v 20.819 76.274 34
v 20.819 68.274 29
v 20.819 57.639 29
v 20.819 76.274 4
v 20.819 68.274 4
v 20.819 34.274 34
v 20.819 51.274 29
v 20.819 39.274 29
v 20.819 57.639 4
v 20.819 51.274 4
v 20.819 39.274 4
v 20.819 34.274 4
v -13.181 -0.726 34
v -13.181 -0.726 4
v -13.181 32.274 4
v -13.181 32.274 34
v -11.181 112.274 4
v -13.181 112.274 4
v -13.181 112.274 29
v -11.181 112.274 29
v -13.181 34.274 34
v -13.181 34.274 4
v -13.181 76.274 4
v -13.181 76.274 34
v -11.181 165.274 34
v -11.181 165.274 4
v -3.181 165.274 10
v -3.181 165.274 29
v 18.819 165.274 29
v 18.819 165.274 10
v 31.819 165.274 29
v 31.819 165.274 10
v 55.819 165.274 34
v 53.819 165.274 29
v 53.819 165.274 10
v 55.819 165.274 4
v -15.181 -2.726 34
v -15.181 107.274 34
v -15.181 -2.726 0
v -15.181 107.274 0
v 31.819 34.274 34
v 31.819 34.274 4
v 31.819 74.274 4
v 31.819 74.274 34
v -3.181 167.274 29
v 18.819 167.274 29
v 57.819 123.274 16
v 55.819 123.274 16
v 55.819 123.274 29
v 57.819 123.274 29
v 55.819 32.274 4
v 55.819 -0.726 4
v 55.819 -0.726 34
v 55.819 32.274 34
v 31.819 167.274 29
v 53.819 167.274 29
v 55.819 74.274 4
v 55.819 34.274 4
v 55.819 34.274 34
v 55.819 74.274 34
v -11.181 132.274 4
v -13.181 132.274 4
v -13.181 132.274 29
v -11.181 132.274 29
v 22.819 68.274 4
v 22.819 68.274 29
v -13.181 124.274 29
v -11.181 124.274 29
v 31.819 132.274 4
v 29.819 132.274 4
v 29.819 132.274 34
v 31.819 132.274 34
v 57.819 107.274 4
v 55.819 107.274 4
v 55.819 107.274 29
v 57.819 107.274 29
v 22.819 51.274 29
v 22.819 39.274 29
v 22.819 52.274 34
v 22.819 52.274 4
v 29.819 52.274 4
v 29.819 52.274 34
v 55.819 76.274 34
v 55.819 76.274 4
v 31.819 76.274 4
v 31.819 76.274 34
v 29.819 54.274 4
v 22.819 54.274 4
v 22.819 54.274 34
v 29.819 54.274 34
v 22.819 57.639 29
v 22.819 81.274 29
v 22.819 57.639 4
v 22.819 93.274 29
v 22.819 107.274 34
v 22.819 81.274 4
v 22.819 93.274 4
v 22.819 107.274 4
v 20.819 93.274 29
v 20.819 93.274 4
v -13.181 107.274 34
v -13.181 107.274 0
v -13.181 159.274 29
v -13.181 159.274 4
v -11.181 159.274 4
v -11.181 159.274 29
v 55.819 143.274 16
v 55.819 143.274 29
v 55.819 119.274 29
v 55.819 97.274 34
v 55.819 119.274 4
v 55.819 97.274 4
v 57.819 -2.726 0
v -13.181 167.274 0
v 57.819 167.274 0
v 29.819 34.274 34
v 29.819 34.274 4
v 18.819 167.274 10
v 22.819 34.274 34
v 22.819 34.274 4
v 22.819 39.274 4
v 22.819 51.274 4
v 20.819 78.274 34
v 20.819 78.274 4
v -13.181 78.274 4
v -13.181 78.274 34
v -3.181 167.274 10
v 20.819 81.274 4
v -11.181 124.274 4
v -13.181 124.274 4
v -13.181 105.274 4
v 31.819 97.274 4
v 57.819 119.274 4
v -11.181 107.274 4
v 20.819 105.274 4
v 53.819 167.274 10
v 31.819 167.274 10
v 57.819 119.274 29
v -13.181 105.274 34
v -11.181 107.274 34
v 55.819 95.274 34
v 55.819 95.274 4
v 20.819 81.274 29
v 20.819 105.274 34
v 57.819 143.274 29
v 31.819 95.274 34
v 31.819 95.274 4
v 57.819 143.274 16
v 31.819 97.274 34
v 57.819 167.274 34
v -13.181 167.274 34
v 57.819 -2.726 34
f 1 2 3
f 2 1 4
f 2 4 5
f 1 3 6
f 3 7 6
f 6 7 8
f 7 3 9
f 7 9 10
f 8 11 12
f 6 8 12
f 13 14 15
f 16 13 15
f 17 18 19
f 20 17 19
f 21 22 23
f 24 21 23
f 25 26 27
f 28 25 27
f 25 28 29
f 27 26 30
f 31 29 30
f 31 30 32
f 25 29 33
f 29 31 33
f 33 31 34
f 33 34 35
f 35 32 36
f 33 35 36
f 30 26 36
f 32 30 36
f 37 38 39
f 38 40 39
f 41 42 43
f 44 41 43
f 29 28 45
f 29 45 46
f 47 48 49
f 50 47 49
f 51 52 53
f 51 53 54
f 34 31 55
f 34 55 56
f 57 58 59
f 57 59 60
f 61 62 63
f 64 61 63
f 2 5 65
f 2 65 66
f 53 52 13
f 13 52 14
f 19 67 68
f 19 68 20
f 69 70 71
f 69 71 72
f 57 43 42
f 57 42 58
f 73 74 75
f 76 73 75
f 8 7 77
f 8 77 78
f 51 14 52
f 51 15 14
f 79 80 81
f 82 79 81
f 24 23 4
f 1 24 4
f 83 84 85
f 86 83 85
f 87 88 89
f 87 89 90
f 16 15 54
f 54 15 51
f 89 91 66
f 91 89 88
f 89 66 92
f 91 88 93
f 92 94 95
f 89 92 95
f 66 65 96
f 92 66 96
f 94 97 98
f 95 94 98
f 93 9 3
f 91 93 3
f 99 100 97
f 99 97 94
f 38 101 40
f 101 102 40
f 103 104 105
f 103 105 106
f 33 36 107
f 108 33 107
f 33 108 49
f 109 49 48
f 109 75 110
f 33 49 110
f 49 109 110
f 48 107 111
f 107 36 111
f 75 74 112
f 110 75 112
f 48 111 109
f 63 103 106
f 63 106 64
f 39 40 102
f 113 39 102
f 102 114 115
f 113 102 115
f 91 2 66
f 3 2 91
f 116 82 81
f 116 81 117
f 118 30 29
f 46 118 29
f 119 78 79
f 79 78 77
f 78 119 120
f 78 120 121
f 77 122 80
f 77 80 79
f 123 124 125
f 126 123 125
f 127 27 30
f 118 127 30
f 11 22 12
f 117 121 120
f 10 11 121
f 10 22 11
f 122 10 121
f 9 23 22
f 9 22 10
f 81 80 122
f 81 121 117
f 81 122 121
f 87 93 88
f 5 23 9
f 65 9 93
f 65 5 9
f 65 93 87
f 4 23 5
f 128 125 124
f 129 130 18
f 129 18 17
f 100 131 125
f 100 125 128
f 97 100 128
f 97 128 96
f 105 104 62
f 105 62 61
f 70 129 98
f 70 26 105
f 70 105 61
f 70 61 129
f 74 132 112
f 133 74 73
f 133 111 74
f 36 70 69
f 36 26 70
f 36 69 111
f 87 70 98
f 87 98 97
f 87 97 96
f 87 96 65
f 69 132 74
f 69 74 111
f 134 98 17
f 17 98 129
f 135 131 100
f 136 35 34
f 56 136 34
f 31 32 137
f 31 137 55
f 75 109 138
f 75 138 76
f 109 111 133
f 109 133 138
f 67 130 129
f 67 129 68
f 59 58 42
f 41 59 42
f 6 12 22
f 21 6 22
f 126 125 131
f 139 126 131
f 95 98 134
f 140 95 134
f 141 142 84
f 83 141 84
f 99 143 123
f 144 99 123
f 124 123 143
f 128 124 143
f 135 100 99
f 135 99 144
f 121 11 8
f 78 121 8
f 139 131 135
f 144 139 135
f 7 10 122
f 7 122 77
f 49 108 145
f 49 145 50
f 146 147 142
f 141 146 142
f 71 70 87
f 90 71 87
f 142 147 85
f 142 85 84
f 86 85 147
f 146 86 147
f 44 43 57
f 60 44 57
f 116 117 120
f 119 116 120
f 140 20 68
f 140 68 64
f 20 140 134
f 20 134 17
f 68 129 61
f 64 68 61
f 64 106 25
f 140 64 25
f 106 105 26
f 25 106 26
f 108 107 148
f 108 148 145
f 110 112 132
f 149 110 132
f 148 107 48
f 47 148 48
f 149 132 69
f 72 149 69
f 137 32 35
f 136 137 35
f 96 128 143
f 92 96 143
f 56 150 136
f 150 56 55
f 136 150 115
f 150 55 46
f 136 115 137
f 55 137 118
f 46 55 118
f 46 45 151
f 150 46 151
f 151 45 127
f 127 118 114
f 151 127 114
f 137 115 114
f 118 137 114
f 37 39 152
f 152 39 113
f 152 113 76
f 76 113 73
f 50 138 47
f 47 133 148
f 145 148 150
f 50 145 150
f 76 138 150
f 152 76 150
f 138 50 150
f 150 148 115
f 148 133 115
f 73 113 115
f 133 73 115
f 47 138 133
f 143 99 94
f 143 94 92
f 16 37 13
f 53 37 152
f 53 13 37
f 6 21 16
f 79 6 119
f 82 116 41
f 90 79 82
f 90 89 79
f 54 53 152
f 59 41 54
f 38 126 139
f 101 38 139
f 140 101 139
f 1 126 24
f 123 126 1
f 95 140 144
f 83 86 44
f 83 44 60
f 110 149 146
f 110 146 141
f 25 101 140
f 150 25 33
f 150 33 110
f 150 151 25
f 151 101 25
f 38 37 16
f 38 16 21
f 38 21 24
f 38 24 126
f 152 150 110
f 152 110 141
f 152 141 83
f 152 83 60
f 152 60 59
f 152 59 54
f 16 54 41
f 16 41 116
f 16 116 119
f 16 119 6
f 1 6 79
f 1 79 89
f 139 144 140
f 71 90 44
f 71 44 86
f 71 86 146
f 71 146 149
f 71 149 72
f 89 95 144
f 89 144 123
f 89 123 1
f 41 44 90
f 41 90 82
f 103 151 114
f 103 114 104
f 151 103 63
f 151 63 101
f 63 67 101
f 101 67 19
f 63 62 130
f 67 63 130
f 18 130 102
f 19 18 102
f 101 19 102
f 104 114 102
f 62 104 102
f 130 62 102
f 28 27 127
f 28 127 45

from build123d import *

# Parameters (mm, degrees)
F2_W      = 2
F2_H      = 110
F3_DEPTH  = 4
F4_W      = 2
F4_H      = 33
F4_H_2    = 40
F4_H_3    = 27
F4_H_4    = 19
F4_H_5    = 35
F4_W_2    = 7
F4_H_6    = 2
F5_DEPTH  = 30
F6_W      = 12
F6_H      = 25
F6_W_2    = 27
F7_DEPTH  = 2
F8_W      = 12
F8_H      = 25
F8_W_2    = 20
F8_H_2    = 13
F9_DEPTH  = 2
F10_W     = 22
F10_H     = 19
F11_DEPTH = 2
F12_W     = 12
F12_H     = 25
F12_W_2   = 10.6349699199
F13_DEPTH = 2


with BuildPart() as f3:
    # F2 (on Top) → F3 (new body)
    with BuildSketch(Plane.XY):
        Polygon((57.8188975325, 167.2736013268), (-13.1811024675, 167.2736013268), (-13.1811024675, 107.2736013268), (-13.1811024675, -2.7263986732), (57.8188975325, -2.7263986732), align=None)
        with Locations((-14.1811024675, 52.2736013268)):
            Rectangle(F2_W, F2_H)
    extrude(amount=F3_DEPTH)

    # F4 (on face) → F5 (join)
    with BuildSketch(Plane.XY.offset(4)):
        with Locations((56.8188975325, 15.7736013268)):
            Rectangle(F4_W, F4_H)
        with Locations((56.8188975325, 54.2736013268)):
            Rectangle(F4_W, F4_H_2)
        Polygon((-13.1811024675, 167.2736013268), (-13.1811024675, 107.2736013268), (-11.1811024675, 107.2736013268), (-11.1811024675, 165.2736013268), (-11.1811024675, 167.2736013268), align=None)
        Polygon((-11.1811024675, 167.2736013268), (-11.1811024675, 165.2736013268), (55.8188975325, 165.2736013268), (57.8188975325, 165.2736013268), (57.8188975325, 167.2736013268), align=None)
        Polygon((-15.1811024675, -0.7263986732), (-15.1811024675, -2.7263986732), (57.8188975325, -2.7263986732), (57.8188975325, -0.7263986732), (55.8188975325, -0.7263986732), (27.8188975325, -0.7263986732), (25.8188975325, -0.7263986732), (-13.1811024675, -0.7263986732), align=None)
        Polygon((-11.1811024675, 107.2736013268), (-13.1811024675, 107.2736013268), (-13.1811024675, 105.2736013268), (20.8188975325, 105.2736013268), (22.8188975325, 105.2736013268), (22.8188975325, 107.2736013268), align=None)
        Polygon((55.8188975325, 76.2736013268), (57.8188975325, 76.2736013268), (57.8188975325, 165.2736013268), (55.8188975325, 165.2736013268), (55.8188975325, 97.2736013268), (55.8188975325, 95.2736013268), align=None)
        Polygon((-15.1811024675, 107.2736013268), (-15.1811024675, -0.7263986732), (-13.1811024675, -0.7263986732), (-13.1811024675, 32.2736013268), (-13.1811024675, 34.2736013268), (-13.1811024675, 76.2736013268), (-13.1811024675, 78.2736013268), (-13.1811024675, 105.2736013268), (-13.1811024675, 107.2736013268), align=None)
        Polygon((55.8188975325, 74.2736013268), (57.8188975325, 74.2736013268), (57.8188975325, 76.2736013268), (55.8188975325, 76.2736013268), (31.8188975325, 76.2736013268), (29.8188975325, 76.2736013268), (29.8188975325, 74.2736013268), (31.8188975325, 74.2736013268), align=None)
        Polygon((55.8188975325, 32.2736013268), (57.8188975325, 32.2736013268), (57.8188975325, 34.2736013268), (55.8188975325, 34.2736013268), (31.8188975325, 34.2736013268), (29.8188975325, 34.2736013268), (22.8188975325, 34.2736013268), (20.8188975325, 34.2736013268), (-13.1811024675, 34.2736013268), (-13.1811024675, 32.2736013268), (25.8188975325, 32.2736013268), (27.8188975325, 32.2736013268), align=None)
        with Locations((21.8188975325, 91.7736013268)):
            Rectangle(F4_W, F4_H_3)
        Polygon((20.8188975325, 76.2736013268), (20.8188975325, 34.2736013268), (22.8188975325, 34.2736013268), (22.8188975325, 52.2736013268), (22.8188975325, 54.2736013268), (22.8188975325, 76.2736013268), align=None)
        Polygon((-13.1811024675, 78.2736013268), (-13.1811024675, 76.2736013268), (20.8188975325, 76.2736013268), (22.8188975325, 76.2736013268), (22.8188975325, 78.2736013268), (20.8188975325, 78.2736013268), align=None)
        with Locations((30.8188975325, 85.7736013268)):
            Rectangle(F4_W, F4_H_4)
        Polygon((55.8188975325, 95.2736013268), (55.8188975325, 97.2736013268), (31.8188975325, 97.2736013268), (29.8188975325, 97.2736013268), (29.8188975325, 95.2736013268), (31.8188975325, 95.2736013268), align=None)
        with Locations((30.8188975325, 114.7736013268)):
            Rectangle(F4_W, F4_H_5)
        Polygon((29.8188975325, 34.2736013268), (31.8188975325, 34.2736013268), (31.8188975325, 74.2736013268), (29.8188975325, 74.2736013268), (29.8188975325, 54.2736013268), (29.8188975325, 52.2736013268), align=None)
        with Locations((26.3188975325, 53.2736013268)):
            Rectangle(F4_W_2, F4_H_6)
    extrude(amount=F5_DEPTH)

    # F6 (on face) → F7 (cut)
    with BuildSketch(Plane(origin=(-13.1811024675, 0, 0), x_dir=(0, -1, 0), z_dir=(-1, 0, 0))):
        with Locations((-118.2736013268, 16.5)):
            Rectangle(F6_W, F6_H)
        with Locations((-145.7736013268, 16.5)):
            Rectangle(F6_W_2, F6_H)
    extrude(amount=-F7_DEPTH, mode=Mode.SUBTRACT)

    # F8 (on face) → F9 (cut)
    with BuildSketch(Plane(origin=(55.8188975325, 0, 0), x_dir=(0, -1, 0), z_dir=(-1, 0, 0))):
        with Locations((-113.2736013268, 16.5)):
            Rectangle(F8_W, F8_H)
        with Locations((-133.2736013268, 22.5)):
            Rectangle(F8_W_2, F8_H_2)
    extrude(amount=-F9_DEPTH, mode=Mode.SUBTRACT)

    # F10 (on face) → F11 (cut)
    with BuildSketch(Plane.XZ.offset(-165.2736013268)):
        with Locations((42.8188975325, 19.5)):
            Rectangle(F10_W, F10_H)
        with Locations((7.8188975325, 19.5)):
            Rectangle(F10_W, F10_H)
    extrude(amount=-F11_DEPTH, mode=Mode.SUBTRACT)

    # F12 (on face) → F13 (cut)
    with BuildSketch(Plane(origin=(20.8188975325, 0, 0), x_dir=(0, -1, 0), z_dir=(-1, 0, 0))):
        with Locations((-87.2736013268, 16.5)):
            Rectangle(F12_W, F12_H)
        with Locations((-62.9561163669, 16.5)):
            Rectangle(F12_W_2, F12_H)
        with Locations((-45.2736013268, 16.5)):
            Rectangle(F12_W, F12_H)
    extrude(amount=-F13_DEPTH, mode=Mode.SUBTRACT)


solid = f3.part
